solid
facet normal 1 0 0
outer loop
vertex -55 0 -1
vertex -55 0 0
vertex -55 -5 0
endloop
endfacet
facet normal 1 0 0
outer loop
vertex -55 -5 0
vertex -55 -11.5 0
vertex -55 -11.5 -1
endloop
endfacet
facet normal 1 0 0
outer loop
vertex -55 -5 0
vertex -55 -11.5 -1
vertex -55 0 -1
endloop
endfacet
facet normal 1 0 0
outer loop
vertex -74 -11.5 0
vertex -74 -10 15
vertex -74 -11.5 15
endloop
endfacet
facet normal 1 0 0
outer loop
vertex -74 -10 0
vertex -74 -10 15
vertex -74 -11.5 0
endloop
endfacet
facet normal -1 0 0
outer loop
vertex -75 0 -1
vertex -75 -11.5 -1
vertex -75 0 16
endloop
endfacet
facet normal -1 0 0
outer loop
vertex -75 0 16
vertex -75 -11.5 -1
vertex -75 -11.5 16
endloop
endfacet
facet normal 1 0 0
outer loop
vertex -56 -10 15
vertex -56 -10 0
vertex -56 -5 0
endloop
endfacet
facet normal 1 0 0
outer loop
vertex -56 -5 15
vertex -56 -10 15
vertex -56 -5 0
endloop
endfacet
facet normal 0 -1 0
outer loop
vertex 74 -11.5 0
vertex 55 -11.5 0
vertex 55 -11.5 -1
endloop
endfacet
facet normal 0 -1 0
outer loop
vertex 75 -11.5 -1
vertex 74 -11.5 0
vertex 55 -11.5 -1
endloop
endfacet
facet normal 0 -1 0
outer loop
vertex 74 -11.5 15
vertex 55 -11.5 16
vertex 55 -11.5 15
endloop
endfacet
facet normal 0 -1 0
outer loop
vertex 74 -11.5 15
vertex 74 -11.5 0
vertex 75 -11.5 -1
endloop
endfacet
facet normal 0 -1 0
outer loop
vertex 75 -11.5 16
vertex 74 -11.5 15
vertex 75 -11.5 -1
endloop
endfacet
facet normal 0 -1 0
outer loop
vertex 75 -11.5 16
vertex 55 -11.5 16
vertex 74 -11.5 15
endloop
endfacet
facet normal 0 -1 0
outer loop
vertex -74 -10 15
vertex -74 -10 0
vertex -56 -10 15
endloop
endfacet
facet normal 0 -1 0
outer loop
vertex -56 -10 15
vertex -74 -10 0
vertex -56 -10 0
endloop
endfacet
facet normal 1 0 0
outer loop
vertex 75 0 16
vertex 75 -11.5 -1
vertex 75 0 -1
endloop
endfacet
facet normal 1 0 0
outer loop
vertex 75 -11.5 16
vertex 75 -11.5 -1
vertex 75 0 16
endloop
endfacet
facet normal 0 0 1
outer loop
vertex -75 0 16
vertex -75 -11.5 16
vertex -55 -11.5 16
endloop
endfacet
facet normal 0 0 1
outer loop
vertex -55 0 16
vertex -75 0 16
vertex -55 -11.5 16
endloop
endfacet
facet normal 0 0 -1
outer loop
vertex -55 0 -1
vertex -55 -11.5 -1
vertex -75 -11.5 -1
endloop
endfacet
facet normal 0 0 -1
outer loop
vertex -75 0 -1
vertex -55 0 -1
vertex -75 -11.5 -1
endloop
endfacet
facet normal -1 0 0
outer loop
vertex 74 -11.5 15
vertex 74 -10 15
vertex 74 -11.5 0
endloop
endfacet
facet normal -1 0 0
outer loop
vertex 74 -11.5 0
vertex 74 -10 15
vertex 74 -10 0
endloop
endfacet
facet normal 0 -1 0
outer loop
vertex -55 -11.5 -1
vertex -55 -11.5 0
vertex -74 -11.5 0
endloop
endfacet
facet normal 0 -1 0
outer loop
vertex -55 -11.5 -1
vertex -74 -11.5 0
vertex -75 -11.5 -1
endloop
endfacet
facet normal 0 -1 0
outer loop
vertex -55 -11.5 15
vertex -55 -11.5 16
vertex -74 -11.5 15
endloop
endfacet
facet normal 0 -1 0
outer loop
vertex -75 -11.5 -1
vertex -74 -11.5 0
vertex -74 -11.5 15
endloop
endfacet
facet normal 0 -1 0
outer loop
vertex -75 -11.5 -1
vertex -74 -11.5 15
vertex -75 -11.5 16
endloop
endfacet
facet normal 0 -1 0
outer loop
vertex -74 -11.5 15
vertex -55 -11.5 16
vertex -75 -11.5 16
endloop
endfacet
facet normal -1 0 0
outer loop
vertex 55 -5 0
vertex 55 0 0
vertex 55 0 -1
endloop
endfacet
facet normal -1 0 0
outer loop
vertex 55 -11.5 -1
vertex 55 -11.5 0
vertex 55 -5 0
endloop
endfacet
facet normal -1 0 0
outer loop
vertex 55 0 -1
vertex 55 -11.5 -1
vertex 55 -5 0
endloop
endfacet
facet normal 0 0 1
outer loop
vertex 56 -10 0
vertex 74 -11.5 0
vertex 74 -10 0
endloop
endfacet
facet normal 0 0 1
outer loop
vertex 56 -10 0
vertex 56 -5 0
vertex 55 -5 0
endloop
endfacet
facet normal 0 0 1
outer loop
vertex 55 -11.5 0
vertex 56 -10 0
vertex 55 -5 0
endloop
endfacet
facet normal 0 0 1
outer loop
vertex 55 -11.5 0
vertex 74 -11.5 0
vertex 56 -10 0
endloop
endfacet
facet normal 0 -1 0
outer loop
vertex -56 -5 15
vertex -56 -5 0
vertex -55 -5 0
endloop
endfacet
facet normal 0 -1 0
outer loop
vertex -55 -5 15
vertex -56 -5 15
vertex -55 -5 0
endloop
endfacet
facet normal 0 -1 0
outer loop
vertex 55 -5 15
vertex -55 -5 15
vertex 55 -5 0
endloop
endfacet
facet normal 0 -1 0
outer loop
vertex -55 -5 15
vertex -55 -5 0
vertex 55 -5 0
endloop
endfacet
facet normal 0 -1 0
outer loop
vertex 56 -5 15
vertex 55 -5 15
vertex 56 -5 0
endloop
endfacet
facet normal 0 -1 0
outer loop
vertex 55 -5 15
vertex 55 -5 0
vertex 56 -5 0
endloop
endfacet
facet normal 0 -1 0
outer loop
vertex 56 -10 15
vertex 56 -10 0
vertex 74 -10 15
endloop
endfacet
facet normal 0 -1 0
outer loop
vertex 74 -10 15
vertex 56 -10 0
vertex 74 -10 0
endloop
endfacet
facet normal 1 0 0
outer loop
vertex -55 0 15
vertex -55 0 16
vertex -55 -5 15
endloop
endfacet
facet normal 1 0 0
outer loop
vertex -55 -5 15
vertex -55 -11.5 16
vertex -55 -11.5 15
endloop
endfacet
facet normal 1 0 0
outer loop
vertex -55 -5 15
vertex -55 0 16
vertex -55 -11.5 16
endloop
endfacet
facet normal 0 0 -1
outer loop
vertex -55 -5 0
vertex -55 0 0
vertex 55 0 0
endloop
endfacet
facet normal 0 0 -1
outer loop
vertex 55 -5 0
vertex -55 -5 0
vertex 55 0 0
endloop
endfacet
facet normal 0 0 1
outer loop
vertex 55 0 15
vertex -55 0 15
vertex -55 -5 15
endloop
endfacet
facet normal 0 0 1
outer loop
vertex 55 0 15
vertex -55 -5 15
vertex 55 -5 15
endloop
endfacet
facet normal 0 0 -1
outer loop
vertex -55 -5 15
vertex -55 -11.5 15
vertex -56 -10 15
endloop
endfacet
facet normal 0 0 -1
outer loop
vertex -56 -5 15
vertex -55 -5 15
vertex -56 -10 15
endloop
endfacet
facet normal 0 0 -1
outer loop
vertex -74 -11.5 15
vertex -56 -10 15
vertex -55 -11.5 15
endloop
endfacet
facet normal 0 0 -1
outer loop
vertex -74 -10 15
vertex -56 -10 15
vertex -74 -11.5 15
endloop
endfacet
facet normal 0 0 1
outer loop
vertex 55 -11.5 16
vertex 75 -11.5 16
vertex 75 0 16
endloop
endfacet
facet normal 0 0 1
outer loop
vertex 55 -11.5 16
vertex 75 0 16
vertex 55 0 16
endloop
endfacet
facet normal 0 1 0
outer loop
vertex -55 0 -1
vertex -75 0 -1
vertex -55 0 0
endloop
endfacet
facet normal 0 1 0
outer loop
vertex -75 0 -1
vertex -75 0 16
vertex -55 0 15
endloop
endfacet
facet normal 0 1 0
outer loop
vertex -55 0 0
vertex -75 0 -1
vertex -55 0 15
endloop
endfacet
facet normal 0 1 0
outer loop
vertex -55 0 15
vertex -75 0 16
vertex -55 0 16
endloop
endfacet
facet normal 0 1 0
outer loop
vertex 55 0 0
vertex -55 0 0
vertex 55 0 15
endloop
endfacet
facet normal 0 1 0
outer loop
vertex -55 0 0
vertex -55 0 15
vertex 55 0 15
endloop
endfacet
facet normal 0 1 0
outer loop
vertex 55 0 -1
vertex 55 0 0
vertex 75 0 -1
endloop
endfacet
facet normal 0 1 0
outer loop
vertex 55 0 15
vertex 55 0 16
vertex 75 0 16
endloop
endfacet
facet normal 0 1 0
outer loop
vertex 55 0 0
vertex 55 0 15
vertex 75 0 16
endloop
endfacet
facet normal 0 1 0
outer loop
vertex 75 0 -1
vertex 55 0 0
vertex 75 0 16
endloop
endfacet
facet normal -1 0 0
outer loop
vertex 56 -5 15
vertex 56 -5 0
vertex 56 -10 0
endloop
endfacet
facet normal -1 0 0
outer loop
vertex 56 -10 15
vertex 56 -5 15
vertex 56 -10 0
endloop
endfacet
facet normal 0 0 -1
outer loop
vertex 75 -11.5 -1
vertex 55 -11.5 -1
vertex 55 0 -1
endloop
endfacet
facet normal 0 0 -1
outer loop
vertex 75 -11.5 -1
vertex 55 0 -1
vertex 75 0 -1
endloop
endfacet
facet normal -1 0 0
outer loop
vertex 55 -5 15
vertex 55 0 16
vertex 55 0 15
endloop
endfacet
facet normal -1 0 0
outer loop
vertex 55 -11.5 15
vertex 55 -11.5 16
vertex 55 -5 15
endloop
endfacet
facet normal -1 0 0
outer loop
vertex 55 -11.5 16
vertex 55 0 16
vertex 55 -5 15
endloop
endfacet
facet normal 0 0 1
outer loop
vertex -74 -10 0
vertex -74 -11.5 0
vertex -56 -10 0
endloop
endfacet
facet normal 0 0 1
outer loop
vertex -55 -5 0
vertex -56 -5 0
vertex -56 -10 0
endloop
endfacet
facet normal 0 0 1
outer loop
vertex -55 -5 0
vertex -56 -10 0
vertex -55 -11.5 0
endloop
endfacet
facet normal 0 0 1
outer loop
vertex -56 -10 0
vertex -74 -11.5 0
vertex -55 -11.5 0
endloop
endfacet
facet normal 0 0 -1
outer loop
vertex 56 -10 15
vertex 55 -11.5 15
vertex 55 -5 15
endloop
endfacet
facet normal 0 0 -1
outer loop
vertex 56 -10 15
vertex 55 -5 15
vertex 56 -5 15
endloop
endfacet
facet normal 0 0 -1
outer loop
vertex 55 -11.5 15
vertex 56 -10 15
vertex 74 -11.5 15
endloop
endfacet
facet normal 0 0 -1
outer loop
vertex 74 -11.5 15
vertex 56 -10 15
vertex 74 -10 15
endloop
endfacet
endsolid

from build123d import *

# Parameters (mm, degrees)
AUFSATZ_LINEAR_AUSTRAGEN1_DEPTH             = 15
AUFSATZ_LINEAR_AUSTRAGEN4_DEPTH             = 1.5
AUFSATZ_LINEAR_AUSTRAGEN4_DIRECTION_2_REACH = 78.164


with BuildPart() as part:
    # Skizze1 → Aufsatz-Linear austragen1 (new body)
    with BuildSketch(Plane.XY):
        Polygon((-74, 0), (-74, -10), (-56, -10), (-56, -5), (56, -5), (56, -10), (74, -10), (74, 0), align=None)
    extrude(amount=AUFSATZ_LINEAR_AUSTRAGEN1_DEPTH)

    # Skizze5 → Aufsatz-Linear austragen4 (add)
    with BuildSketch(Plane.XZ.offset(10)):
        Polygon((56, 0), (55, 0), (55, -1), (56, -1), (75, -1), (75, 16), (56, 16), (55, 16), (55, 15), (56, 15), (74, 15), (74, 0), align=None)
    aufsatz_linear_austragen4 = extrude(amount=AUFSATZ_LINEAR_AUSTRAGEN4_DEPTH)

    # Aufsatz-Linear austragen4 direction 2: up to this face of the body (flat: up to its plane)
    aufsatz_linear_austragen4_direction_2_end = Plane(part.part.faces().sort_by_distance((0, 0, 7.5))[0])
    # Skizze5 → Aufsatz-Linear austragen4 direction 2 (add, up to the picked face)
    with BuildSketch(Plane.XZ.offset(10), mode=Mode.PRIVATE) as aufsatz_linear_austragen4_direction_2_sk1:
        Polygon((56, 0), (55, 0), (55, -1), (56, -1), (75, -1), (75, 16), (56, 16), (55, 16), (55, 15), (56, 15), (74, 15), (74, 0), align=None)
    aufsatz_linear_austragen4_direction_2_tool1 = split(extrude(aufsatz_linear_austragen4_direction_2_sk1.sketch, amount=-AUFSATZ_LINEAR_AUSTRAGEN4_DIRECTION_2_REACH, mode=Mode.PRIVATE), bisect_by=aufsatz_linear_austragen4_direction_2_end, keep=Keep.BOTH, mode=Mode.PRIVATE)
    aufsatz_linear_austragen4_direction_2 = aufsatz_linear_austragen4_direction_2_tool1.solids().sort_by(Axis((55.5, -10, -0.262488), (0, 1, 0)))[0]
    add(aufsatz_linear_austragen4_direction_2)

    # Spiegeln1: Aufsatz-Linear austragen4, Aufsatz-Linear austragen4 direction 2 across plane
    add(aufsatz_linear_austragen4.mirror(Plane(origin=(0, 0, 0), x_dir=(0, 0, 1), z_dir=(1, 0, 0))))
    add(aufsatz_linear_austragen4_direction_2.mirror(Plane(origin=(0, 0, 0), x_dir=(0, 0, 1), z_dir=(1, 0, 0))))


solid = part.part
